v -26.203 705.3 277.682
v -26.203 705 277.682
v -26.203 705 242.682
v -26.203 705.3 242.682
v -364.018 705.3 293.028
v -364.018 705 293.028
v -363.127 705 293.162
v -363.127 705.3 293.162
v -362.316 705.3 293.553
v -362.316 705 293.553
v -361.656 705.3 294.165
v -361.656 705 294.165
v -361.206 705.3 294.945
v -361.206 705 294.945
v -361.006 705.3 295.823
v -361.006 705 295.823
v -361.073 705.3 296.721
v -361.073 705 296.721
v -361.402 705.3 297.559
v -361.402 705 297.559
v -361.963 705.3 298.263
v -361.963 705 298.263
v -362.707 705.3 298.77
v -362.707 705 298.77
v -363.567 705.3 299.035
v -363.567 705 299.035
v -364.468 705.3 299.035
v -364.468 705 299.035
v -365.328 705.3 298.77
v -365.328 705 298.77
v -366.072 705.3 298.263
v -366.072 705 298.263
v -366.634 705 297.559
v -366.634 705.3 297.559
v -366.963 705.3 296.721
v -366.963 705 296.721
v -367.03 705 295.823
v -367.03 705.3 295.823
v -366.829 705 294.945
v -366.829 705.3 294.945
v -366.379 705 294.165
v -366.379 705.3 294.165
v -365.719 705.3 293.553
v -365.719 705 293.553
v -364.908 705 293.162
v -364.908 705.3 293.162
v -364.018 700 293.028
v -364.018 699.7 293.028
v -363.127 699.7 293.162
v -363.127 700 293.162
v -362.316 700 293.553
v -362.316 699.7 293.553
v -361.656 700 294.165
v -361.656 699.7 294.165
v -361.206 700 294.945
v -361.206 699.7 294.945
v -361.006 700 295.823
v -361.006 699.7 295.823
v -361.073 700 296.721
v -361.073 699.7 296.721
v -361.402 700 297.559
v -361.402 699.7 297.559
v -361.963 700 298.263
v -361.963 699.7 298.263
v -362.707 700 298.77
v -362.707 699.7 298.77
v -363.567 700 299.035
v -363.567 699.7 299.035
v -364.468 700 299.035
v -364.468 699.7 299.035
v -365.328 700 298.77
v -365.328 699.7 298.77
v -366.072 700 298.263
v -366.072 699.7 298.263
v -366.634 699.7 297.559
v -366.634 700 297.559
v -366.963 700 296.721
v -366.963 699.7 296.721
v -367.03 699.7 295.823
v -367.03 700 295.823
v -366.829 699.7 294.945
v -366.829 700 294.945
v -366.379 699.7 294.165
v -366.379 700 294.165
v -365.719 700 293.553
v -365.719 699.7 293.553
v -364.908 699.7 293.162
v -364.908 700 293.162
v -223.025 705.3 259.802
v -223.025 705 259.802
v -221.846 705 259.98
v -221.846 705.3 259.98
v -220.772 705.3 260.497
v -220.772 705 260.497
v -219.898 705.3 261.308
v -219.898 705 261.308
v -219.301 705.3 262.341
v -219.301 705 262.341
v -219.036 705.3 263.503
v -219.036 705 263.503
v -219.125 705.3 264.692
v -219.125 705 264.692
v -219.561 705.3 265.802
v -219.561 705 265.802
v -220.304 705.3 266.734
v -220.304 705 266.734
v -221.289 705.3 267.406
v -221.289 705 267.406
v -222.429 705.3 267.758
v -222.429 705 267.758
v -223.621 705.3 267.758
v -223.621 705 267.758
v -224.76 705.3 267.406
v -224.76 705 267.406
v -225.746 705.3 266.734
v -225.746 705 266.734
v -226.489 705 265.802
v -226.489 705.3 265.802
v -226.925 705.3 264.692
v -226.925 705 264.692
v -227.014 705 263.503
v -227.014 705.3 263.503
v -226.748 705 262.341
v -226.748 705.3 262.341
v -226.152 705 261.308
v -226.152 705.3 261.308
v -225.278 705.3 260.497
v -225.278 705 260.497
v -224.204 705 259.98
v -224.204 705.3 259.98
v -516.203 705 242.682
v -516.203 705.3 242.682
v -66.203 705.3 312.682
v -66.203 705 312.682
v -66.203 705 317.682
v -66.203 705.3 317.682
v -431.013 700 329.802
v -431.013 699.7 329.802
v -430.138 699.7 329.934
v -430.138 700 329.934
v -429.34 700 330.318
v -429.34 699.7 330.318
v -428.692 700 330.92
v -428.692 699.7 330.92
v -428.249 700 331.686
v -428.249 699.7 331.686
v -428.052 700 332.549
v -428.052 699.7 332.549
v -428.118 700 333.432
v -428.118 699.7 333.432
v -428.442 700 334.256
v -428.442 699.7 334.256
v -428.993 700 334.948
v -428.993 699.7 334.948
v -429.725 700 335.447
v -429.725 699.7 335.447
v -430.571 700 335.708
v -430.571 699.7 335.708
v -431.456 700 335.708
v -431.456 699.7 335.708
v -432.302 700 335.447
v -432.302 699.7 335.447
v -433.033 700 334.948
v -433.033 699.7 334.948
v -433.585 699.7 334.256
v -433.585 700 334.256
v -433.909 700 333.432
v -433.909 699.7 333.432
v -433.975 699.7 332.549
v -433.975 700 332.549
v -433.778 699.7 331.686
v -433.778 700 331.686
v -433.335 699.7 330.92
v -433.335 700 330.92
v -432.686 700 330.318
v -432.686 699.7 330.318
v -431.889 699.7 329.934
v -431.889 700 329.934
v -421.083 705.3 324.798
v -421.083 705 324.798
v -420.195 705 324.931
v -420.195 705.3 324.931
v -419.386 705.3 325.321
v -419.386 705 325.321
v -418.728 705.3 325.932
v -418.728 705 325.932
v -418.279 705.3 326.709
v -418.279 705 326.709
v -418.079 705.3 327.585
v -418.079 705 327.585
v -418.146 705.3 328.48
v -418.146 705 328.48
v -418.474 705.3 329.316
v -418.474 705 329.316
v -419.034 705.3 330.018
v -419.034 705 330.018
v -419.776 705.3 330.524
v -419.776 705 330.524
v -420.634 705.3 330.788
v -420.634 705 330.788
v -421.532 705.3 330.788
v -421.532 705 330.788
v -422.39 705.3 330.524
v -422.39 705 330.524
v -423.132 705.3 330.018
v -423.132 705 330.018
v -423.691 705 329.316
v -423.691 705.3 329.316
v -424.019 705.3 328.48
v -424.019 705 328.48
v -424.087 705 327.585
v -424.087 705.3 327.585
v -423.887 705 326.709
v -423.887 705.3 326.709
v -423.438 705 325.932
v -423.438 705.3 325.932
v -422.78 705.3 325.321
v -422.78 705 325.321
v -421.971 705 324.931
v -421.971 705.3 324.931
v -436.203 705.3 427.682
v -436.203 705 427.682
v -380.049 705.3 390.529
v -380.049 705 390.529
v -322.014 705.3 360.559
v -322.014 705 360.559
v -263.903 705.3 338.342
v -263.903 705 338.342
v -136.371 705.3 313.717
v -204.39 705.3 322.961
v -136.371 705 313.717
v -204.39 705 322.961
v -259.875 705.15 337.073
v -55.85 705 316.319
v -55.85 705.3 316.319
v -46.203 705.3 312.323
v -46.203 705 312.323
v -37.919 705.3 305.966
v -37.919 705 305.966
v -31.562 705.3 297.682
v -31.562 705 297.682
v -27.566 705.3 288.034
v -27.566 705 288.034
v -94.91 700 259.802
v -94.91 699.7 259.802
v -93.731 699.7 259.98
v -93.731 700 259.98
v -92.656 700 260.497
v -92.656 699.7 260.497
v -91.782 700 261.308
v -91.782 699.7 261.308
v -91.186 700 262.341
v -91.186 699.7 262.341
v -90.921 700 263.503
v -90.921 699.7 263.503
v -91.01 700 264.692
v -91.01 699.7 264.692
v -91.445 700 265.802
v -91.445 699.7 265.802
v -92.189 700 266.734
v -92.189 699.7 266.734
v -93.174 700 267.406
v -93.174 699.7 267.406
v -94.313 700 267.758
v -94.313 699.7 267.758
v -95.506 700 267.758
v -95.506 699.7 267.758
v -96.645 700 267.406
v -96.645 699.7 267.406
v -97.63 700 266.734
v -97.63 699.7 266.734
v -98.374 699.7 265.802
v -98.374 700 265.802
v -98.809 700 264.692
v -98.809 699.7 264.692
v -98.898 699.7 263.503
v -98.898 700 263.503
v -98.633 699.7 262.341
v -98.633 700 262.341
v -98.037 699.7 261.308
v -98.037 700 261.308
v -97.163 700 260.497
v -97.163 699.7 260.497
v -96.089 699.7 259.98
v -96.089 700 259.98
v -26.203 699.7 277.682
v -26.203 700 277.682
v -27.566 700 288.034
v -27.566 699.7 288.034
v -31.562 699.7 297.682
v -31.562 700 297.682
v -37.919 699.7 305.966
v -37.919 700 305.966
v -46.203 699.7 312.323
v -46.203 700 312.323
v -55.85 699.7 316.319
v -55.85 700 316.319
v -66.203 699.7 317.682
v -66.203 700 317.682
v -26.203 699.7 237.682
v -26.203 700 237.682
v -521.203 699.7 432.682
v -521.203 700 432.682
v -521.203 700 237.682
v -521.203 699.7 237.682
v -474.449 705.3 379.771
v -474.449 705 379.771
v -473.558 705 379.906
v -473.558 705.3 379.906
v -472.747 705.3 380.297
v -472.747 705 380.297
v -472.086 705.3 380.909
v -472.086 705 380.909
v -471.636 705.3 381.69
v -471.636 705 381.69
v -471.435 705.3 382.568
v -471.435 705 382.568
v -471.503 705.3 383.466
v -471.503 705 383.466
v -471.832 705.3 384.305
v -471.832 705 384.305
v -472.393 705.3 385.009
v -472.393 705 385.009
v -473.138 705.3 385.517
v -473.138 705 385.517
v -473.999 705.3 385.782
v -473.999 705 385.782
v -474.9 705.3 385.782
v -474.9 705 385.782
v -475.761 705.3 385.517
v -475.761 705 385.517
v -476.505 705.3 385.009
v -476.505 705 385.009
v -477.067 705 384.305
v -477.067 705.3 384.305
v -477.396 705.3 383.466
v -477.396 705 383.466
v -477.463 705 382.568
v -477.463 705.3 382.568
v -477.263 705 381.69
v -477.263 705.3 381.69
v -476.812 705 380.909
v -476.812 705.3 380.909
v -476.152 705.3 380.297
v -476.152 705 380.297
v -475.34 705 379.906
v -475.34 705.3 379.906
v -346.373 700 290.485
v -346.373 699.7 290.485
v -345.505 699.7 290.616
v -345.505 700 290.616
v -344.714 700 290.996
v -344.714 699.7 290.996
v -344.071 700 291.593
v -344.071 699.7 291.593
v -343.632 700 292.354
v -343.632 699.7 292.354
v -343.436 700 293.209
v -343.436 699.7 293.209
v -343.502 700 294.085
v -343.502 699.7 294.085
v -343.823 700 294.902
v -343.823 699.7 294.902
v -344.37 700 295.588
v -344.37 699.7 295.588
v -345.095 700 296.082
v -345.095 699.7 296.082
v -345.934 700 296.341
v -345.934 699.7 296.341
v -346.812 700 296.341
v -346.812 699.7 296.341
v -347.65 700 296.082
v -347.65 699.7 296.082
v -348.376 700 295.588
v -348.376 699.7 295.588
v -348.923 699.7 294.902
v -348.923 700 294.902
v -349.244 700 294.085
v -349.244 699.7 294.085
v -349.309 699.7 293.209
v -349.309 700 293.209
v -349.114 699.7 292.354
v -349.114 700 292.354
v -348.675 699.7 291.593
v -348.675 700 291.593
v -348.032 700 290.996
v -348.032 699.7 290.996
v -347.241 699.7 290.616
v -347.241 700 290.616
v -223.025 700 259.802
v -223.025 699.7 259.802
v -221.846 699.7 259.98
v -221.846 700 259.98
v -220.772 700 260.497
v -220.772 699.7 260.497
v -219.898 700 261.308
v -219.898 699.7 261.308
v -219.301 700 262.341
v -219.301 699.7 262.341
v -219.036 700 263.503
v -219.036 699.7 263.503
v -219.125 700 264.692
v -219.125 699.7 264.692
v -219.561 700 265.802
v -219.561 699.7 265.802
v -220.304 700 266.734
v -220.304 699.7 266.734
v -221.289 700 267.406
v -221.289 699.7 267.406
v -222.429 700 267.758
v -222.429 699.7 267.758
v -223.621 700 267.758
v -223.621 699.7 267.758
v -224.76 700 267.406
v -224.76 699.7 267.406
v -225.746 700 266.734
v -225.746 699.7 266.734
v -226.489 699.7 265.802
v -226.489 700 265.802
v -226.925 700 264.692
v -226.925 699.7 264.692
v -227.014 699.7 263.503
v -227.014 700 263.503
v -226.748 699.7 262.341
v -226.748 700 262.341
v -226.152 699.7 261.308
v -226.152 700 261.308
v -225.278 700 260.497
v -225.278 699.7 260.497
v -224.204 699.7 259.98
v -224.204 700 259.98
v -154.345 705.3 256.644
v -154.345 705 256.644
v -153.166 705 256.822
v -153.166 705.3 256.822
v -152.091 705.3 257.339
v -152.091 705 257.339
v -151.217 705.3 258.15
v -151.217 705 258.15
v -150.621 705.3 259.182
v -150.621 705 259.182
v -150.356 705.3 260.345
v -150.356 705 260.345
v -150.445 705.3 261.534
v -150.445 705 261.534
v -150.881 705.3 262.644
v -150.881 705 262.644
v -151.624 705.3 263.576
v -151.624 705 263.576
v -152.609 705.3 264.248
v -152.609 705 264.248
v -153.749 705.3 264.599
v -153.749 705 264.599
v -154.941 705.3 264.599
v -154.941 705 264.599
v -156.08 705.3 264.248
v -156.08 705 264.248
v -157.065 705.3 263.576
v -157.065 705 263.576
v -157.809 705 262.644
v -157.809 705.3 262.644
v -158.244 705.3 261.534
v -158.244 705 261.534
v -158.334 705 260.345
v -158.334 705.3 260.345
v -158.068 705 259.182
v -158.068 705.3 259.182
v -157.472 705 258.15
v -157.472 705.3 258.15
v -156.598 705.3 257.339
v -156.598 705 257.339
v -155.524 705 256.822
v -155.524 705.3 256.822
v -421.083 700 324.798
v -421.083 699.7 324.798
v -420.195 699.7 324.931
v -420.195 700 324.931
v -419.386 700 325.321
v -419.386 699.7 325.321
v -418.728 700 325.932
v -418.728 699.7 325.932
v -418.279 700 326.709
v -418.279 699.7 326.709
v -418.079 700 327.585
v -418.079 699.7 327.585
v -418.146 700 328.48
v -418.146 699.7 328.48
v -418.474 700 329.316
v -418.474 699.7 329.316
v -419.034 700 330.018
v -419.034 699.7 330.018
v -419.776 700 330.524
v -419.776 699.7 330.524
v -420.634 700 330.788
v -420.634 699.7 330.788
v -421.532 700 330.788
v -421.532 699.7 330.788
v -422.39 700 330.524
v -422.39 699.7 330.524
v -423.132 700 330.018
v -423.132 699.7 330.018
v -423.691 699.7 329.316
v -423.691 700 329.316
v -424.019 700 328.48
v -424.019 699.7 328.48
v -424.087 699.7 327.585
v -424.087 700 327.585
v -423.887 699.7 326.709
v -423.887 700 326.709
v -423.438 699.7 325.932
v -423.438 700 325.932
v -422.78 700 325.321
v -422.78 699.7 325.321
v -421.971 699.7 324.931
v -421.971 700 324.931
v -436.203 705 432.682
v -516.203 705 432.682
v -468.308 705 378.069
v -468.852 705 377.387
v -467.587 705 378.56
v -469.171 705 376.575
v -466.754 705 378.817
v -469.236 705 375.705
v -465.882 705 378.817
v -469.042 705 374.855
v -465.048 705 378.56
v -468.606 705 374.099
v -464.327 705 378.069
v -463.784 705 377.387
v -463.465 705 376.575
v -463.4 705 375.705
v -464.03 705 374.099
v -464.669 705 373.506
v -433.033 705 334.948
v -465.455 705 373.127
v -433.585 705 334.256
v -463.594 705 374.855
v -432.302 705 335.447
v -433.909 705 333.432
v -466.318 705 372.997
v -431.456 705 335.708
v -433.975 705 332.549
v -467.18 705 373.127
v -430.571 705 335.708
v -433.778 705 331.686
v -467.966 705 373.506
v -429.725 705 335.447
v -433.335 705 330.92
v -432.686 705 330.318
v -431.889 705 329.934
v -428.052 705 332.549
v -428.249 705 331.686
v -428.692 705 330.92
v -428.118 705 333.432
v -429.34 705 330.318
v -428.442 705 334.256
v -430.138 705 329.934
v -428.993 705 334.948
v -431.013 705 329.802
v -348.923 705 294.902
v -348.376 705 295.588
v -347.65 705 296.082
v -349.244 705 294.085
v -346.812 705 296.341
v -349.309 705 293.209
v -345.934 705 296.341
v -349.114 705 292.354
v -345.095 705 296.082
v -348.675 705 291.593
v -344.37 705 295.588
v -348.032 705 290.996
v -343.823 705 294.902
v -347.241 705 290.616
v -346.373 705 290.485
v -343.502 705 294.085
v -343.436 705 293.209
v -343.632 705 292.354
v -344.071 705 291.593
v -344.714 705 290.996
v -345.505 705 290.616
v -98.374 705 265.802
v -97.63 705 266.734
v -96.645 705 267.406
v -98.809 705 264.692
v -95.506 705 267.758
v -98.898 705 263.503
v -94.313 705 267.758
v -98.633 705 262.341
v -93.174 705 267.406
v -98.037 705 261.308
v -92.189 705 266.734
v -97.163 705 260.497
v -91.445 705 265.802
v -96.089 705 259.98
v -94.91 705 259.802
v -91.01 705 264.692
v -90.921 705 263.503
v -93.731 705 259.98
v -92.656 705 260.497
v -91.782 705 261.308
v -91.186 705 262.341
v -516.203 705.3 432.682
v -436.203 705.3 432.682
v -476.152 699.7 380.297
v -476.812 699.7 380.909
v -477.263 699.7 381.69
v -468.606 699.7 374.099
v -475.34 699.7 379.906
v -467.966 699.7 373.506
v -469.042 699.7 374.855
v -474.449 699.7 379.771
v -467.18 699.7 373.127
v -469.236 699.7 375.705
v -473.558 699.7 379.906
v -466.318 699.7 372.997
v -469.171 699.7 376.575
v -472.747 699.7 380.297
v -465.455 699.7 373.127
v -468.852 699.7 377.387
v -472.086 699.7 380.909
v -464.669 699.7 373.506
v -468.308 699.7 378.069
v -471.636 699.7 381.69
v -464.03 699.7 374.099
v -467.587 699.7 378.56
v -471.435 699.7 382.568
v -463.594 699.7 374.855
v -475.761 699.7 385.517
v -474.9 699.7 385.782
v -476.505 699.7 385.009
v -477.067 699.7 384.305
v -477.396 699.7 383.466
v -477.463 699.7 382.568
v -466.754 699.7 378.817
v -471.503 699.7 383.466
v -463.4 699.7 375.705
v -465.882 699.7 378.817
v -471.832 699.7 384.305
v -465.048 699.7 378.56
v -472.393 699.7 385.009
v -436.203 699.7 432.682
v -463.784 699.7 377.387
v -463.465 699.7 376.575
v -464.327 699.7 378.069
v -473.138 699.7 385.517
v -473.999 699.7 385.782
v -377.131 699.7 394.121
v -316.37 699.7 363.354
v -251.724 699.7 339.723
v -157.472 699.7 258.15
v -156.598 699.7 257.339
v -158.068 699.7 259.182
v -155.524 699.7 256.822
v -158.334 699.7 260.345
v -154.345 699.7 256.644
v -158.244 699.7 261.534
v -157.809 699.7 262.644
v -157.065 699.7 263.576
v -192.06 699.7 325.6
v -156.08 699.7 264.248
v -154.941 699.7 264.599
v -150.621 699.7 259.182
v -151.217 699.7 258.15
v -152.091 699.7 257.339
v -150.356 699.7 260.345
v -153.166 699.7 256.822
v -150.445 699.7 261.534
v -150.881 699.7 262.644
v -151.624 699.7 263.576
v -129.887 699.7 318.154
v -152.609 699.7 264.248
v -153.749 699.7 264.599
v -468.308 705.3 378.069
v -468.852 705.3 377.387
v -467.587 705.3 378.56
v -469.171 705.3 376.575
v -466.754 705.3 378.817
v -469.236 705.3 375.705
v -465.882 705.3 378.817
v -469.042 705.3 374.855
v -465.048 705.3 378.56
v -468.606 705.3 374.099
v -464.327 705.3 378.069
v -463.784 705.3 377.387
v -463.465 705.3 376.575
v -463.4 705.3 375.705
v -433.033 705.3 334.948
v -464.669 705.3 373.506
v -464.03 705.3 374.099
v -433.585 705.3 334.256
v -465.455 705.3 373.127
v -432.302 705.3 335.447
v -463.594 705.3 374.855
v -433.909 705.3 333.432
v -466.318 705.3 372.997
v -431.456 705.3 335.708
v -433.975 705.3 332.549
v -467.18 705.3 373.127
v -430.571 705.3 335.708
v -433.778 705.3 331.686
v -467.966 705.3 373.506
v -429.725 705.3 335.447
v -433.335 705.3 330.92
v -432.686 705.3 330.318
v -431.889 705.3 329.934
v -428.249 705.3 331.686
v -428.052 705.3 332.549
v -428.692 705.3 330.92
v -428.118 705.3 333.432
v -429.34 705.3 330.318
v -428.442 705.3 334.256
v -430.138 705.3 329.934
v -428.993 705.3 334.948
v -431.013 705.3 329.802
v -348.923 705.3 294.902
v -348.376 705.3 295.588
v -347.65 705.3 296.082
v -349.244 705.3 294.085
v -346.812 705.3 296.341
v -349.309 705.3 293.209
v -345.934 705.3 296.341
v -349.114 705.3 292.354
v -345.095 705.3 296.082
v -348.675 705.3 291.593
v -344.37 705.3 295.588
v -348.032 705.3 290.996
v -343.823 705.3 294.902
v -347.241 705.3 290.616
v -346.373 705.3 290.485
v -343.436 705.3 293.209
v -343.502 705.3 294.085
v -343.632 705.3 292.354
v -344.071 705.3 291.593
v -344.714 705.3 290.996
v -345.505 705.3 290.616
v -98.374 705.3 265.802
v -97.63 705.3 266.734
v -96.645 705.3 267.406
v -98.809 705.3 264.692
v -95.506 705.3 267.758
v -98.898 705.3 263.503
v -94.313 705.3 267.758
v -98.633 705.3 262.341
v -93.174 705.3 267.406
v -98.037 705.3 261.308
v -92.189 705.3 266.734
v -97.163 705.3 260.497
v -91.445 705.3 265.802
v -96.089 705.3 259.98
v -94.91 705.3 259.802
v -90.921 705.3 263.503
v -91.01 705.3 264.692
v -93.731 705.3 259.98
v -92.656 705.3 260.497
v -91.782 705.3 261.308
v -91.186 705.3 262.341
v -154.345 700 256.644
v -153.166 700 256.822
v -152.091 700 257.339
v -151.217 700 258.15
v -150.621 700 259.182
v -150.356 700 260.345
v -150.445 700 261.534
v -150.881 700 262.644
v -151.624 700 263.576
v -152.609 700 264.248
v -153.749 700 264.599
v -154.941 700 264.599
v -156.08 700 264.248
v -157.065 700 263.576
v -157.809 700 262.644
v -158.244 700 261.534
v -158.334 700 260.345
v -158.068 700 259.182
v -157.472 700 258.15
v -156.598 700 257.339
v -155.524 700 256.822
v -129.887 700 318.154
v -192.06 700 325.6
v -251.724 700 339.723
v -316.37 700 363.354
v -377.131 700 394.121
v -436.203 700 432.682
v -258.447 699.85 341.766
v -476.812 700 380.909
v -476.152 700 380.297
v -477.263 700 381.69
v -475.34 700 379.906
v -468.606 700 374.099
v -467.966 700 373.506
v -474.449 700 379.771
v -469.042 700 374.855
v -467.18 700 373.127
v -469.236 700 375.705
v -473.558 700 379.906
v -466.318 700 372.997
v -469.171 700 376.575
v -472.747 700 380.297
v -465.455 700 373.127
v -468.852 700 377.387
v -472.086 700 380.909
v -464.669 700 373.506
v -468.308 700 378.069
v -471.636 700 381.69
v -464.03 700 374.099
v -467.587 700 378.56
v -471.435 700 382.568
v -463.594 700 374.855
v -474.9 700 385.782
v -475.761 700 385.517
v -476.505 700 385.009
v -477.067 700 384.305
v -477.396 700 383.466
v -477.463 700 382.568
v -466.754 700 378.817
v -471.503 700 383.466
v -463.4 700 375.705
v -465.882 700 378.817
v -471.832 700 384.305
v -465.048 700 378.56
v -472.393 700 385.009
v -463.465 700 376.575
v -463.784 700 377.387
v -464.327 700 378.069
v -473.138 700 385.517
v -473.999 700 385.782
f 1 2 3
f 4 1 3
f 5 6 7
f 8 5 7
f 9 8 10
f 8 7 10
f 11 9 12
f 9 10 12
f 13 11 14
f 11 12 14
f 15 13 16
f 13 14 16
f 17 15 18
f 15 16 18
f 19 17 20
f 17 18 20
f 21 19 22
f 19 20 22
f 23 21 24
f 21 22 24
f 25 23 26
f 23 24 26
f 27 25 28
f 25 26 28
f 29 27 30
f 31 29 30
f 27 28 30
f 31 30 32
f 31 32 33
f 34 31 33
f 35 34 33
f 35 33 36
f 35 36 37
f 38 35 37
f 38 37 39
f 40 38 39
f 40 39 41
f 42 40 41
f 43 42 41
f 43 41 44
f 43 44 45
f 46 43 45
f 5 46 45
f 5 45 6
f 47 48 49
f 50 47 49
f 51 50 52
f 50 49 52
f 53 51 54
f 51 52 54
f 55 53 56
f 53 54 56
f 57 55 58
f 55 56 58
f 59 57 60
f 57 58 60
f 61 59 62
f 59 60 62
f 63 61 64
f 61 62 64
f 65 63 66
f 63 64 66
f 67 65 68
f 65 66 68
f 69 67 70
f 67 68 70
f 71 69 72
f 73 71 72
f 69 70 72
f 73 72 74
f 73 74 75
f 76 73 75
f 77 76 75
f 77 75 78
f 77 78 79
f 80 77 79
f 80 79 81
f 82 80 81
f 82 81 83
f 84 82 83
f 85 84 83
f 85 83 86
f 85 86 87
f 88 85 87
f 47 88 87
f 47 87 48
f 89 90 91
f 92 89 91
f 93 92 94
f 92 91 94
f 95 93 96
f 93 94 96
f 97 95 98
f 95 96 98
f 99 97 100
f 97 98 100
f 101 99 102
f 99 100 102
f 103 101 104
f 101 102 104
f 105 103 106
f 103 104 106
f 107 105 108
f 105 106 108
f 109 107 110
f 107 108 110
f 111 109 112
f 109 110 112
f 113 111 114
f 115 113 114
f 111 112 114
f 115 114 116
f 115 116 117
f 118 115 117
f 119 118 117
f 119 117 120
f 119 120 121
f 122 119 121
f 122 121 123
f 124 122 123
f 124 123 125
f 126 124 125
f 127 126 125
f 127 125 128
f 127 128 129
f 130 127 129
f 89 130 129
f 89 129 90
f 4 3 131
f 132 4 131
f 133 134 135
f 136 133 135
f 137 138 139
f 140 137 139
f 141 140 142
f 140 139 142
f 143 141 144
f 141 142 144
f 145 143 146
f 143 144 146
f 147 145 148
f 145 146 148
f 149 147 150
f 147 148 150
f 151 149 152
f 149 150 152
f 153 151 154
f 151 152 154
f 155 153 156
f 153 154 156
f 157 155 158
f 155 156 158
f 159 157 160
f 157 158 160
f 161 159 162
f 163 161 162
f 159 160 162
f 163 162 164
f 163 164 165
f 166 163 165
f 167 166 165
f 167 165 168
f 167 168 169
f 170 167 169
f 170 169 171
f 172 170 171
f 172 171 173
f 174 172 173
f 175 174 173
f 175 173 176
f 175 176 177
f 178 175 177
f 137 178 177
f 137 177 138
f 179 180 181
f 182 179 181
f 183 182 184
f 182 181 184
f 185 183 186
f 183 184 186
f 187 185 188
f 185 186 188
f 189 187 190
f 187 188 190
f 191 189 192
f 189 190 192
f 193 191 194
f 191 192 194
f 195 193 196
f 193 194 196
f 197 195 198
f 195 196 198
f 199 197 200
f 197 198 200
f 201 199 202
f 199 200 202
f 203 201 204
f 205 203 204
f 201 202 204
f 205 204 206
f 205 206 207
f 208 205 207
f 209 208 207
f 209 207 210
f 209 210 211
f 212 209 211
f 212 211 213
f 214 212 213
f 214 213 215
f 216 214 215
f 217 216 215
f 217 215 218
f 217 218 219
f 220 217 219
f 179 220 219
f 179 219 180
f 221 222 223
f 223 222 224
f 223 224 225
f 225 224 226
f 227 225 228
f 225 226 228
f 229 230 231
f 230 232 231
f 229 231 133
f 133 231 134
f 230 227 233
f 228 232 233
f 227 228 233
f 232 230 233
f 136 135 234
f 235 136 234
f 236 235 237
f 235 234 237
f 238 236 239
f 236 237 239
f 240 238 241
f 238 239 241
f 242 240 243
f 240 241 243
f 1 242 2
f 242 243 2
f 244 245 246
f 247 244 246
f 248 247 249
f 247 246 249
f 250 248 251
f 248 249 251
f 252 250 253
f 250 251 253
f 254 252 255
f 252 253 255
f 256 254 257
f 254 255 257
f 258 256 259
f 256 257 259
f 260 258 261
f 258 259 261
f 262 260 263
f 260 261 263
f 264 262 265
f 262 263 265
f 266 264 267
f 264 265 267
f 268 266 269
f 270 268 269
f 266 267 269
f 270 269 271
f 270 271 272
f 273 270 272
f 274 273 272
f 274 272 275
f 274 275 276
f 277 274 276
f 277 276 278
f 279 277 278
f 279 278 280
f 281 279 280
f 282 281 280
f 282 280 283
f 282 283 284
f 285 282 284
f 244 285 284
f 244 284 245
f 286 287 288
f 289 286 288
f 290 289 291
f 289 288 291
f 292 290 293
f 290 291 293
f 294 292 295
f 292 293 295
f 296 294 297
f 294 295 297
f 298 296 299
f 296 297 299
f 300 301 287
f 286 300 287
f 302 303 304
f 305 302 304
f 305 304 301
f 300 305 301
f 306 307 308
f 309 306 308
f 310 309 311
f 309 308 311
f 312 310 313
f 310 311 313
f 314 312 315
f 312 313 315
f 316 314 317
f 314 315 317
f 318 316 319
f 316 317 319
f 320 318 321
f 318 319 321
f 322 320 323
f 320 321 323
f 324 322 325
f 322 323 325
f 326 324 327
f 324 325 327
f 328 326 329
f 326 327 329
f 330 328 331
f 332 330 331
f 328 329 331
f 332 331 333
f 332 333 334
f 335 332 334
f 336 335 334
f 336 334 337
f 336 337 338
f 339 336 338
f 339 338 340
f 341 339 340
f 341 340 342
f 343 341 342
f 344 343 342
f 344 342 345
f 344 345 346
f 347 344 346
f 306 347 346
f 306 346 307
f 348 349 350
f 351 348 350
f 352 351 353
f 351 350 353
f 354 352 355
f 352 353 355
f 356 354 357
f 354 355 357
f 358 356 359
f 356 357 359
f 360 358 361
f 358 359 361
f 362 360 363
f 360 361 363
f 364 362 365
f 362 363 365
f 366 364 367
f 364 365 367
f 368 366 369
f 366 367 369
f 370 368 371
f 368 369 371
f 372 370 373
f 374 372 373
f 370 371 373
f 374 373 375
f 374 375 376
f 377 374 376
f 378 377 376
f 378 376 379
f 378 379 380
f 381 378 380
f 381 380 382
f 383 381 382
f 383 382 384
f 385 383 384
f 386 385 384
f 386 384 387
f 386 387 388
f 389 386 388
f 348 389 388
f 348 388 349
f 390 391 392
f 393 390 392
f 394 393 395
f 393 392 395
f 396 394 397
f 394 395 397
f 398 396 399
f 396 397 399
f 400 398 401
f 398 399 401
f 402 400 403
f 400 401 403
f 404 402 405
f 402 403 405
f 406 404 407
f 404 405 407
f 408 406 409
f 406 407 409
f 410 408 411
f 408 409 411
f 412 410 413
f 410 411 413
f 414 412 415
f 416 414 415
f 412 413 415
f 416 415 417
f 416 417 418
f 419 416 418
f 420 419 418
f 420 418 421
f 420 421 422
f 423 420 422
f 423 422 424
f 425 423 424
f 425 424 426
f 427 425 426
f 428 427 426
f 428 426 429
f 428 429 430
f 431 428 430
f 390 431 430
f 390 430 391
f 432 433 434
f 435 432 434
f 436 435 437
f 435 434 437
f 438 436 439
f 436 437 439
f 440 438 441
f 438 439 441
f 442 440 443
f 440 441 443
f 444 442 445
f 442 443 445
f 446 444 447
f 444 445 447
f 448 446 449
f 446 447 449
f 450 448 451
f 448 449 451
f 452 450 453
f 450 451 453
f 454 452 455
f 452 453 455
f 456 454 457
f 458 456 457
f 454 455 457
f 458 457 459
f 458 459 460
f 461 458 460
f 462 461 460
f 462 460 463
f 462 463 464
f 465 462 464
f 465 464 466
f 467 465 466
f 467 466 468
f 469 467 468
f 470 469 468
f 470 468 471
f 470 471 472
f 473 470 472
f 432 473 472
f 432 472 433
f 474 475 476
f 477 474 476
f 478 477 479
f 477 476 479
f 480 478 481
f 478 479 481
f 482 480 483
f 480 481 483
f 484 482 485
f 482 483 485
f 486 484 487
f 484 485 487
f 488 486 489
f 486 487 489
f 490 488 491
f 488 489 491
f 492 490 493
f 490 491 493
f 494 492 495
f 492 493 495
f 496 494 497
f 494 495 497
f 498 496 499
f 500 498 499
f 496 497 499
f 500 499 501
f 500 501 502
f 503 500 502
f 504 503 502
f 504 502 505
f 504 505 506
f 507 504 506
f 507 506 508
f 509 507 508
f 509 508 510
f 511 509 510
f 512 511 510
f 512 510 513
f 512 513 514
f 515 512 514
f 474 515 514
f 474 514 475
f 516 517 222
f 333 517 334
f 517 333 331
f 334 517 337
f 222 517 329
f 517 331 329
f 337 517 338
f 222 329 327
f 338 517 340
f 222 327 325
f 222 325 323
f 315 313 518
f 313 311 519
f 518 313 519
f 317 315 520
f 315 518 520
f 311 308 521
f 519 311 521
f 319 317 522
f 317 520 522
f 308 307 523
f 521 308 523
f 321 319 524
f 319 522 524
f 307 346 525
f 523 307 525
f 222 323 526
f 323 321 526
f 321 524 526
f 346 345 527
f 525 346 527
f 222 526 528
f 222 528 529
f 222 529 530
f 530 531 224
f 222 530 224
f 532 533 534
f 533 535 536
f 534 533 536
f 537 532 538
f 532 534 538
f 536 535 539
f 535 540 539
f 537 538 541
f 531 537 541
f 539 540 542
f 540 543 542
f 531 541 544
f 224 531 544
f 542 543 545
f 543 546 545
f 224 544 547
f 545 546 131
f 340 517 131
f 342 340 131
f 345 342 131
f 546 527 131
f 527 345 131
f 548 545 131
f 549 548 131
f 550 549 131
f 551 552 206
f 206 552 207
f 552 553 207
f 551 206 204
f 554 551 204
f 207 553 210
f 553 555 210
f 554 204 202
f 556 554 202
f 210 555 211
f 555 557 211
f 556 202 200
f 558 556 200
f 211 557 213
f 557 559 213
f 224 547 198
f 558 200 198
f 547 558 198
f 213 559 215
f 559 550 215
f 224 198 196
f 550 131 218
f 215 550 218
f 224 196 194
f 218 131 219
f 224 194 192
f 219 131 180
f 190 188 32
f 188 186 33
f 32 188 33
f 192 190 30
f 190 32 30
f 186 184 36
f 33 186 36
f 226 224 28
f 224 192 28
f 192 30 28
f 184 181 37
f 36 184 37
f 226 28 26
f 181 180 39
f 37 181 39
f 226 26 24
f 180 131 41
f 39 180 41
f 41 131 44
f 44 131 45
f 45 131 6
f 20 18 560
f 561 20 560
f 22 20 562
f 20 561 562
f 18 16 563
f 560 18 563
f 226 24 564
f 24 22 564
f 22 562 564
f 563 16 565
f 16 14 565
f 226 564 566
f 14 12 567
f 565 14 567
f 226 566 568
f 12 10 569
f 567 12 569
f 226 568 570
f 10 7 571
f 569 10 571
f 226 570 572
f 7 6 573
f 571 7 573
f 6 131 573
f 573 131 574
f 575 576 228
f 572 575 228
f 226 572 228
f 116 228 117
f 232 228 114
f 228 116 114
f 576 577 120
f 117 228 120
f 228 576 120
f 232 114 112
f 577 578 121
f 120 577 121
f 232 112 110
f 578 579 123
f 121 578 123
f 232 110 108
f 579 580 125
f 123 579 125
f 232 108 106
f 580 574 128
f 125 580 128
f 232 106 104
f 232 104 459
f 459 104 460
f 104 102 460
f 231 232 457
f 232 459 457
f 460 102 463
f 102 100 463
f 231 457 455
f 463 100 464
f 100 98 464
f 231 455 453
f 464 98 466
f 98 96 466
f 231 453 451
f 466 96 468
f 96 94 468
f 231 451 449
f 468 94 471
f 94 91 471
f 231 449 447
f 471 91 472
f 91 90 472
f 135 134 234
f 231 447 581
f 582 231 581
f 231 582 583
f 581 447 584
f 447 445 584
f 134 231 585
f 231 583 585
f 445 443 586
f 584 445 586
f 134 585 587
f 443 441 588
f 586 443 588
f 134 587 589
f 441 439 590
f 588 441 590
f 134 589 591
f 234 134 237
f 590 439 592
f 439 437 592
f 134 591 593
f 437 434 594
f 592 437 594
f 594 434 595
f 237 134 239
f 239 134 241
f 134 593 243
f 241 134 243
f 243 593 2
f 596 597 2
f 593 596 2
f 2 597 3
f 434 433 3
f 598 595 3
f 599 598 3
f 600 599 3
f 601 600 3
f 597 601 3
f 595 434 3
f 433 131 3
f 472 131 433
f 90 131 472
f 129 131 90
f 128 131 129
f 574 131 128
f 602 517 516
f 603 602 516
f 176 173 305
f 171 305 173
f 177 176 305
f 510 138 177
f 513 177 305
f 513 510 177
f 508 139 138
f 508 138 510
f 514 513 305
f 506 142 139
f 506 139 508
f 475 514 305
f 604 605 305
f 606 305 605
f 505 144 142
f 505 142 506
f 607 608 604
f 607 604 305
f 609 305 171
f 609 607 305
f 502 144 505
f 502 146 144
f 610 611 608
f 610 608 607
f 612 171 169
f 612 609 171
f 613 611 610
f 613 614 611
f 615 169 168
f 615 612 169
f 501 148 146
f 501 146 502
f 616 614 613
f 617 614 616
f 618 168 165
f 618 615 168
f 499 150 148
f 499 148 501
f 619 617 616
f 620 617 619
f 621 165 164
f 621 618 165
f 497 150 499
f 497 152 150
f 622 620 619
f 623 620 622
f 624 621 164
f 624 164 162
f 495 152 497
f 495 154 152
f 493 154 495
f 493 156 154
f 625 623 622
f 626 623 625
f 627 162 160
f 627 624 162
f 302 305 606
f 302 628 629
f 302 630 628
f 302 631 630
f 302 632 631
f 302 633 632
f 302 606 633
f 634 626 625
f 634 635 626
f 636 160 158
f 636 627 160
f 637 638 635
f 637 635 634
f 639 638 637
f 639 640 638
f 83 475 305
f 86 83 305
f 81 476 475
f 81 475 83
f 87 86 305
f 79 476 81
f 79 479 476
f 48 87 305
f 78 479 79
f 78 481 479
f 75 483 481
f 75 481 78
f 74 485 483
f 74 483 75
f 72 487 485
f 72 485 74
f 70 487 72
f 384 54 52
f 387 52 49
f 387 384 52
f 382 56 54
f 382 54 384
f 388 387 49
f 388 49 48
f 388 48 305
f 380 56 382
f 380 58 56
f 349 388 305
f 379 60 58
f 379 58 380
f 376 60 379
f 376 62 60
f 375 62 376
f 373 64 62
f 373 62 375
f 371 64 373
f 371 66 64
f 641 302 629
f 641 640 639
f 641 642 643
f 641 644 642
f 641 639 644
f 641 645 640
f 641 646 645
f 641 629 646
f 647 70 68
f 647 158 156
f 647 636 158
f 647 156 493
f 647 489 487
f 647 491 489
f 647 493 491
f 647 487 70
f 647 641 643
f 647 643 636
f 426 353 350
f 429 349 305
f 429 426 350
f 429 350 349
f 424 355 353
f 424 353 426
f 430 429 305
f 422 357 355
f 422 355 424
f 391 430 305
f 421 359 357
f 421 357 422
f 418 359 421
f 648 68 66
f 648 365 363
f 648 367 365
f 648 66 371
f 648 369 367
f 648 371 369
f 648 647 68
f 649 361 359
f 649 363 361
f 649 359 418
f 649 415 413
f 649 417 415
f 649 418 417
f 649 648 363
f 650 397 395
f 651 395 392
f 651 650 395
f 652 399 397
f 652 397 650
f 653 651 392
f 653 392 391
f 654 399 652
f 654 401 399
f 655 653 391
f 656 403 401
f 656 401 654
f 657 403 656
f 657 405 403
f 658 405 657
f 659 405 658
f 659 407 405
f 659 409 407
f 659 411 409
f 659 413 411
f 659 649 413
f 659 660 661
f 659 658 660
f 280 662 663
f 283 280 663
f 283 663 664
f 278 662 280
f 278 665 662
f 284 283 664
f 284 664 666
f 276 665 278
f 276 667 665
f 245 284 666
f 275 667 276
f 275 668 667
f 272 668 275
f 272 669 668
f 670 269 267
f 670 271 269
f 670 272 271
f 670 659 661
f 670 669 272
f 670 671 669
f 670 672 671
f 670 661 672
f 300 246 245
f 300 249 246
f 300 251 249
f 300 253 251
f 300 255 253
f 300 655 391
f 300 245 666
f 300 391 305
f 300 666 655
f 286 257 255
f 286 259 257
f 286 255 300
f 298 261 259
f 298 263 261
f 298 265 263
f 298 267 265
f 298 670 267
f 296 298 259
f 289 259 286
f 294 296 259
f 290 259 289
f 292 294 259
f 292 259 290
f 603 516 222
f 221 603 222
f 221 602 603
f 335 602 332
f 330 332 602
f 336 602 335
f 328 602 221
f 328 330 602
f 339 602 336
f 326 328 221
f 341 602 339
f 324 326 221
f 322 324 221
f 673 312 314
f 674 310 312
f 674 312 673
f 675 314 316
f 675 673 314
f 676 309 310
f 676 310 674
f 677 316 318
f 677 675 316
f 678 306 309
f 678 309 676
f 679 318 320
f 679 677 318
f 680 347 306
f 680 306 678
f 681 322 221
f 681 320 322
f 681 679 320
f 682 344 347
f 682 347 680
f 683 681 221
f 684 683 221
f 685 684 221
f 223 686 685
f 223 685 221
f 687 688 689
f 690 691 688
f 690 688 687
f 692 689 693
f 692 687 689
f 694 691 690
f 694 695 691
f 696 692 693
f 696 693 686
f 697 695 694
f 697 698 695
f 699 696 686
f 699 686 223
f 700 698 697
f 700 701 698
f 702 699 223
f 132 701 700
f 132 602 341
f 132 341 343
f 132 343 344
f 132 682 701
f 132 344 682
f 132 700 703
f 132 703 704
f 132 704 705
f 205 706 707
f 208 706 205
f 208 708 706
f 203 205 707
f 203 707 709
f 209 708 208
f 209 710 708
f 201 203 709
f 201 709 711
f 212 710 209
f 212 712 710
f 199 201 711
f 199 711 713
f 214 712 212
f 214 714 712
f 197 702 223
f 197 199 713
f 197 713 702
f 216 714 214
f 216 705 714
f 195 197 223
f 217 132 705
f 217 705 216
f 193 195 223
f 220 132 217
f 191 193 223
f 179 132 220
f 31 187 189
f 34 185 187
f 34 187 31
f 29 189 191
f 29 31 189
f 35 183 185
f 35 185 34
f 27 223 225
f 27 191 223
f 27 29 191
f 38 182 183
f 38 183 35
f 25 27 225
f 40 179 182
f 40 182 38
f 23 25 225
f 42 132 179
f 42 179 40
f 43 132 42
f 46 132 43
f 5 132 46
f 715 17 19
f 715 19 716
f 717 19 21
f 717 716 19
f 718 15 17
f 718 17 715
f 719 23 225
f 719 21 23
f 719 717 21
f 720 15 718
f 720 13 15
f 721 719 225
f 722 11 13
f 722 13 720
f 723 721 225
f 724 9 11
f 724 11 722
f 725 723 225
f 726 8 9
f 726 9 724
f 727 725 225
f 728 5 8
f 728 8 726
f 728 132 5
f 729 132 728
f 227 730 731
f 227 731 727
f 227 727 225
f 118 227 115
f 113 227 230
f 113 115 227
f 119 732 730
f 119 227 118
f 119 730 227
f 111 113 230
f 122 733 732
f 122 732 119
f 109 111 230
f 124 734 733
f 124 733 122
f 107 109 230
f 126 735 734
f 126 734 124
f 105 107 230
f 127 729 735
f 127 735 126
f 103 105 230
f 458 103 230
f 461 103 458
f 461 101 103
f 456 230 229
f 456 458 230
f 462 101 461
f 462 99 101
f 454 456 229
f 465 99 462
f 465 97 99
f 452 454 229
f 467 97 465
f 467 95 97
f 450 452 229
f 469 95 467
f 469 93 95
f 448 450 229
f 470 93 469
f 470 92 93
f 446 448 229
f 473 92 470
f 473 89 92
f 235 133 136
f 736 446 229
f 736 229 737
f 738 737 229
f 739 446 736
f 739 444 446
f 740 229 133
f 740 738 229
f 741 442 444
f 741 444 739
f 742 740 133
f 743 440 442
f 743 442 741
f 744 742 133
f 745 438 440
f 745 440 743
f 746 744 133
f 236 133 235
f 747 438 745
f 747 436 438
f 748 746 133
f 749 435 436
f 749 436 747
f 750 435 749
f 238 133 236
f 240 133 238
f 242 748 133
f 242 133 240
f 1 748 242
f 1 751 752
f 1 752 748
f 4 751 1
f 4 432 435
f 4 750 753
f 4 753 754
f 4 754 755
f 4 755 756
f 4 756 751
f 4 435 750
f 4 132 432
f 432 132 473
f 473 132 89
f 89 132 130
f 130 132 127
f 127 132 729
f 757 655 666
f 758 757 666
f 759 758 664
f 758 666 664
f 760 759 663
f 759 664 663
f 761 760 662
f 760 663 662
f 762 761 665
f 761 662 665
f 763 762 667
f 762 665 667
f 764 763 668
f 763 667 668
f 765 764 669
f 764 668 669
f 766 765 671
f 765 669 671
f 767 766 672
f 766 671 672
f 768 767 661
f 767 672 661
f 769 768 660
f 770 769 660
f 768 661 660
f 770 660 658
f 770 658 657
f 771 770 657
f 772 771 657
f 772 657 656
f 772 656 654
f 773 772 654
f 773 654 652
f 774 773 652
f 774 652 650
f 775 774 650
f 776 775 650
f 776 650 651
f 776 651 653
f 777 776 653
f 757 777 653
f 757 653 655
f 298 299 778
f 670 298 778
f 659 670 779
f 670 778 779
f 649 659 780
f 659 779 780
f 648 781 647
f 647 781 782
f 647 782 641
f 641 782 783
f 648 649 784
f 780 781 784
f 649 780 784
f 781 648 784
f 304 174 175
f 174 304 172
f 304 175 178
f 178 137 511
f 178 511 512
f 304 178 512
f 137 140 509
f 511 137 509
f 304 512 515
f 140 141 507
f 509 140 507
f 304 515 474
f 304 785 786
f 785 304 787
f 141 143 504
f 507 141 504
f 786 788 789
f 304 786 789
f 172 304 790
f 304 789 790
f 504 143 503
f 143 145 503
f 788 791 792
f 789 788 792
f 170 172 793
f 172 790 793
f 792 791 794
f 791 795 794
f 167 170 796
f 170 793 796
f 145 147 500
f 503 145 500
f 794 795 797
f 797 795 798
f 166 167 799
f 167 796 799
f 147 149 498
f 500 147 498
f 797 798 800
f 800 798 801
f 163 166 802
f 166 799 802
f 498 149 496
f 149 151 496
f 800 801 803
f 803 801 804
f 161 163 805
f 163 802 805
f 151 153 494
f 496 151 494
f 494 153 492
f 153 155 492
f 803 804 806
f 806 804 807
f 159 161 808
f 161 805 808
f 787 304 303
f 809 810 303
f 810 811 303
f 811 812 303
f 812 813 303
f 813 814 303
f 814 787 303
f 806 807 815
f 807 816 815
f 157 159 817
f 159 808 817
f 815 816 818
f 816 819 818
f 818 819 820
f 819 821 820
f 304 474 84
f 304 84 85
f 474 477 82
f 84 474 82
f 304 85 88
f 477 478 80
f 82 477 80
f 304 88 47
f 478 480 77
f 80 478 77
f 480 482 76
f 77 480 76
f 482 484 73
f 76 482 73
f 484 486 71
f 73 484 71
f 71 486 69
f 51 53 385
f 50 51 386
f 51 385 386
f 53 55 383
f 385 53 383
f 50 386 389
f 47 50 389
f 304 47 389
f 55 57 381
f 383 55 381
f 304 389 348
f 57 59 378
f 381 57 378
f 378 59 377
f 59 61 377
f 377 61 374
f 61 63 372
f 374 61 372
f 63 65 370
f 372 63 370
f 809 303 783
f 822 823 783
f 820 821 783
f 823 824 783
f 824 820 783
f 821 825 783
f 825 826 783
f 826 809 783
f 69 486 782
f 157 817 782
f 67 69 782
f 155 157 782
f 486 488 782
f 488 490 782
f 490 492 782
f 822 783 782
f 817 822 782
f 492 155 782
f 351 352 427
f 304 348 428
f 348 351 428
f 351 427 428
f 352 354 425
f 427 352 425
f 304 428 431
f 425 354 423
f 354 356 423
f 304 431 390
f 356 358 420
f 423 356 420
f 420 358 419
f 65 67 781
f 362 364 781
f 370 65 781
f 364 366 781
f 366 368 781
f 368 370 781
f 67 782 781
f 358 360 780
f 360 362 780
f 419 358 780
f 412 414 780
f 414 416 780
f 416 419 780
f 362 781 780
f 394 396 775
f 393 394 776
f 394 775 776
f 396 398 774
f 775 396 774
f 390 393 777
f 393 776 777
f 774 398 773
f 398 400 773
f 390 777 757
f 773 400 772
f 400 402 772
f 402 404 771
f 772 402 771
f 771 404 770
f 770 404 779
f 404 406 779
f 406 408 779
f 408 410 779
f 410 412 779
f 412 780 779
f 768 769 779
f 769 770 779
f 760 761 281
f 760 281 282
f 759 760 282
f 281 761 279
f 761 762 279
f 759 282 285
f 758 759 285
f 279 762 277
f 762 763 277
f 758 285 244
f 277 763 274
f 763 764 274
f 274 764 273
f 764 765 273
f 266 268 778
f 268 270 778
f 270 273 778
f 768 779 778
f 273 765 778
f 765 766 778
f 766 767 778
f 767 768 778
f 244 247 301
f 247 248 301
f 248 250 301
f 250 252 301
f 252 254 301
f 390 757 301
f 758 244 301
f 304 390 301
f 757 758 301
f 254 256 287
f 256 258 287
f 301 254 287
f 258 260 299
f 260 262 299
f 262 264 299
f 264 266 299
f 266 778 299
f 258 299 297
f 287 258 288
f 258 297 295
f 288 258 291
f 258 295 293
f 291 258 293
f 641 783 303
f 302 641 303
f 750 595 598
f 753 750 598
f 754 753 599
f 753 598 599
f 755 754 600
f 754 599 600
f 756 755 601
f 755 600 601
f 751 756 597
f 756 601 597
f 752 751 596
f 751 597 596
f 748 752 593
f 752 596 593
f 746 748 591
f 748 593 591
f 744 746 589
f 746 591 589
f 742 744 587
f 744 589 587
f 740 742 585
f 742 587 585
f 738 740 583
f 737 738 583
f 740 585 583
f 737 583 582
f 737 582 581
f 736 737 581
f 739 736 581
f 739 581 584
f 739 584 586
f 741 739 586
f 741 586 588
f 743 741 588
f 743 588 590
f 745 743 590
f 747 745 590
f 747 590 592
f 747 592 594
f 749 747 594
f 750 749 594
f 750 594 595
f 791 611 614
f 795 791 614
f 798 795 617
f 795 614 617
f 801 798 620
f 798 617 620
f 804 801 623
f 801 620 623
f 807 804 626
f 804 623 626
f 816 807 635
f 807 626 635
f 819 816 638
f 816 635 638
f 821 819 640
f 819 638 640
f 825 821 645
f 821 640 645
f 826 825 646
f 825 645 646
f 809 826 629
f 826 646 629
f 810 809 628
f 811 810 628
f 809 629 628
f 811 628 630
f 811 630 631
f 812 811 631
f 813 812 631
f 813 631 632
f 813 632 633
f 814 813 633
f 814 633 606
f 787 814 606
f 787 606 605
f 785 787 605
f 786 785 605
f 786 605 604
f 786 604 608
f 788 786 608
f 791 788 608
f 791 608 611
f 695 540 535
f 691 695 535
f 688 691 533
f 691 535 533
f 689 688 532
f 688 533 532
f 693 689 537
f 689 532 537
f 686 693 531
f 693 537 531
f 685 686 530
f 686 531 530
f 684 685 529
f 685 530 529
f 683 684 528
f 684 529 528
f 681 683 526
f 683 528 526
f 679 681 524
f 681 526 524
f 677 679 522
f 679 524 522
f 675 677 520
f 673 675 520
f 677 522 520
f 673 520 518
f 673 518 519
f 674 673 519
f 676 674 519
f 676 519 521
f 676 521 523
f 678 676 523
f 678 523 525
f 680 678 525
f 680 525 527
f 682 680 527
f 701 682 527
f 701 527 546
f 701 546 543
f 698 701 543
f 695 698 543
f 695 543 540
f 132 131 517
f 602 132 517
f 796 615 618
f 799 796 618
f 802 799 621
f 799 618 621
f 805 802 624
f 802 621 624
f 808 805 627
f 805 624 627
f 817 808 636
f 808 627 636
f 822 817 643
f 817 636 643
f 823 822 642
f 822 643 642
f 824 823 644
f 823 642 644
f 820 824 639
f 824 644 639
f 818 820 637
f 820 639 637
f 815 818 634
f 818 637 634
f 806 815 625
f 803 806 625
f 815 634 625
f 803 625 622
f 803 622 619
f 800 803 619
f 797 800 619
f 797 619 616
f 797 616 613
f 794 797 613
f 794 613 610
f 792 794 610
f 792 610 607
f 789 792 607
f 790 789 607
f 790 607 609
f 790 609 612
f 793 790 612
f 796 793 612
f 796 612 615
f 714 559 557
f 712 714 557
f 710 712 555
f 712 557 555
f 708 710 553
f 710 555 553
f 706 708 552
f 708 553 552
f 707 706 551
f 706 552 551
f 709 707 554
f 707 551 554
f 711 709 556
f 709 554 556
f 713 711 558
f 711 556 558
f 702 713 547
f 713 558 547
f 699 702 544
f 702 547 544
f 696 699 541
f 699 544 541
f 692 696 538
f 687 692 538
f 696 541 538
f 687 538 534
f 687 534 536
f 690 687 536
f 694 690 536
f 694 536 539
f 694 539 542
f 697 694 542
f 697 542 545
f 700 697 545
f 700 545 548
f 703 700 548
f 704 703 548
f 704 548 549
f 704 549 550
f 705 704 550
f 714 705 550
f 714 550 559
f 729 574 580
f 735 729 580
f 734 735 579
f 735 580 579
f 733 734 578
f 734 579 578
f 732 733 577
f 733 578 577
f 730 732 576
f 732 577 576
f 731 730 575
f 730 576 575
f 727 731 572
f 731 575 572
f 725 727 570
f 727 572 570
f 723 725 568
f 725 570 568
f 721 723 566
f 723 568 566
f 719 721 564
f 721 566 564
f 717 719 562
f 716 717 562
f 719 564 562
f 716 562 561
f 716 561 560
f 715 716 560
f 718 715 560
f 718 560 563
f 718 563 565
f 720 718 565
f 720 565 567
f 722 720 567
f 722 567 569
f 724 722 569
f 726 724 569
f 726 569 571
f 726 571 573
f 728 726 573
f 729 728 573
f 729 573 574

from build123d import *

# Parameters (mm, degrees)
DODANIE_WYCI_GNI_CIE1_DEPTH = 0.3
DODANIE_WYCI_GNI_CIE2_DEPTH = 0.3
SZKIC3_R                    = 4
SZKIC3_R_2                  = 2.944641831
SZKIC3_R_3                  = 3.020576513
SZKIC3_R_4                  = 3.012177803
SZKIC3_R_5                  = 2.969694601
SZKIC3_R_6                  = 2.926354466
SZKIC3_R_7                  = 3.022325106
WYTNIJ_WYCI_GNI_CIE1_DEPTH  = 20


with BuildPart() as part:
    # Szkic1 → Dodanie-wyciągnięcie1 (new body)
    with BuildSketch(Plane(origin=(0, 705, 0), x_dir=(1, 0, 0), z_dir=(0, 1, 0))):
        with BuildLine():
            Line((-66.202987025, -312.681641948), (-66.202987023, -317.681641948))
            ThreePointArc((-66.202987023, -317.681641948), (-37.918715775, -305.965913195), (-26.202987023, -277.681641948))
            Line((-26.202987023, -277.681641948), (-26.202987023, -242.681641948))
            Line((-26.202987023, -242.681641948), (-516.202987023, -242.681641948))
            Line((-516.202987023, -242.681641948), (-516.202987023, -432.681641948))
            Line((-516.202987023, -432.681641948), (-436.202987023, -432.681641948))
            Line((-436.202987023, -432.681641948), (-436.202986934, -427.681641882))
            add(Edge.make_bspline(
                [(-436.202986934, -427.681641882), (-268.546265032, -303.965113503), (-66.202987025, -312.681641948)],
                knots=[0, 0, 0, 1, 1, 1], degree=2))
        make_face()
    extrude(amount=DODANIE_WYCI_GNI_CIE1_DEPTH)


with BuildPart() as body_2:
    # Szkic2 → Dodanie-wyciągnięcie2 (new body)
    with BuildSketch(Plane.XZ.offset(-700)):
        with BuildLine():
            Line((-521.202987023, 432.681641948), (-521.202987023, 237.681641948))
            Line((-521.202987023, 237.681641948), (-26.202987023, 237.681641948))
            Line((-26.202987023, 237.681641948), (-26.202987023, 277.681641948))
            ThreePointArc((-26.202987023, 277.681641948), (-37.918715775, 305.965913195), (-66.202987023, 317.681641948))
            add(Edge.make_bspline(
                [(-66.202987023, 317.681641948), (-265.691193711, 308.349917645), (-436.202986931, 432.681641881)],
                knots=[0, 0, 0, 1, 1, 1], degree=2))
            Line((-436.202986931, 432.681641881), (-521.202987023, 432.681641948))
        make_face()
    extrude(amount=DODANIE_WYCI_GNI_CIE2_DEPTH)


with BuildPart() as wytnij_wyci_gni_cie1_tool:
    # Szkic3 → Wytnij-wyciągnięcie1 (new body)
    with BuildSketch(Plane.XZ.offset(-699.7)):
        with Locations(Location((-94.909521544, 263.802212936, 0), (0, 0, 270))):
            Circle(SZKIC3_R)
        with Locations(Location((-154.344703344, 260.643821632, 0), (0, 0, 270))):
            Circle(SZKIC3_R)
        with Locations(Location((-223.024834581, 263.802212936, 0), (0, 0, 270))):
            Circle(SZKIC3_R)
        with Locations(Location((-346.372819064, 293.429327819, 0), (0, 0, 270))):
            Circle(SZKIC3_R_2)
        with Locations(Location((-364.017672886, 296.048587357, 0), (0, 0, 270))):
            Circle(SZKIC3_R_3)
        with Locations(Location((-421.082774625, 327.809793479, 0), (0, 0, 270))):
            Circle(SZKIC3_R_4)
        with Locations(Location((-431.013382426, 332.771307187, 0), (0, 0, 270))):
            Circle(SZKIC3_R_5)
        with Locations(Location((-466.31780115, 375.923654109, 0), (0, 0, 270))):
            Circle(SZKIC3_R_6)
        with Locations(Location((-474.449169572, 382.793687092, 0), (0, 0, 270))):
            Circle(SZKIC3_R_7)
    extrude(amount=-WYTNIJ_WYCI_GNI_CIE1_DEPTH)


with BuildPart() as part_1:
    add(part.part)

    # Wytnij-wyciągnięcie1: cut by wytnij_wyci_gni_cie1_tool
    add(wytnij_wyci_gni_cie1_tool.part, mode=Mode.SUBTRACT)


with BuildPart() as body_2_1:
    add(body_2.part)

    # Wytnij-wyciągnięcie1: cut by wytnij_wyci_gni_cie1_tool
    add(wytnij_wyci_gni_cie1_tool.part, mode=Mode.SUBTRACT)


solid = Compound([part_1.part, body_2_1.part])
